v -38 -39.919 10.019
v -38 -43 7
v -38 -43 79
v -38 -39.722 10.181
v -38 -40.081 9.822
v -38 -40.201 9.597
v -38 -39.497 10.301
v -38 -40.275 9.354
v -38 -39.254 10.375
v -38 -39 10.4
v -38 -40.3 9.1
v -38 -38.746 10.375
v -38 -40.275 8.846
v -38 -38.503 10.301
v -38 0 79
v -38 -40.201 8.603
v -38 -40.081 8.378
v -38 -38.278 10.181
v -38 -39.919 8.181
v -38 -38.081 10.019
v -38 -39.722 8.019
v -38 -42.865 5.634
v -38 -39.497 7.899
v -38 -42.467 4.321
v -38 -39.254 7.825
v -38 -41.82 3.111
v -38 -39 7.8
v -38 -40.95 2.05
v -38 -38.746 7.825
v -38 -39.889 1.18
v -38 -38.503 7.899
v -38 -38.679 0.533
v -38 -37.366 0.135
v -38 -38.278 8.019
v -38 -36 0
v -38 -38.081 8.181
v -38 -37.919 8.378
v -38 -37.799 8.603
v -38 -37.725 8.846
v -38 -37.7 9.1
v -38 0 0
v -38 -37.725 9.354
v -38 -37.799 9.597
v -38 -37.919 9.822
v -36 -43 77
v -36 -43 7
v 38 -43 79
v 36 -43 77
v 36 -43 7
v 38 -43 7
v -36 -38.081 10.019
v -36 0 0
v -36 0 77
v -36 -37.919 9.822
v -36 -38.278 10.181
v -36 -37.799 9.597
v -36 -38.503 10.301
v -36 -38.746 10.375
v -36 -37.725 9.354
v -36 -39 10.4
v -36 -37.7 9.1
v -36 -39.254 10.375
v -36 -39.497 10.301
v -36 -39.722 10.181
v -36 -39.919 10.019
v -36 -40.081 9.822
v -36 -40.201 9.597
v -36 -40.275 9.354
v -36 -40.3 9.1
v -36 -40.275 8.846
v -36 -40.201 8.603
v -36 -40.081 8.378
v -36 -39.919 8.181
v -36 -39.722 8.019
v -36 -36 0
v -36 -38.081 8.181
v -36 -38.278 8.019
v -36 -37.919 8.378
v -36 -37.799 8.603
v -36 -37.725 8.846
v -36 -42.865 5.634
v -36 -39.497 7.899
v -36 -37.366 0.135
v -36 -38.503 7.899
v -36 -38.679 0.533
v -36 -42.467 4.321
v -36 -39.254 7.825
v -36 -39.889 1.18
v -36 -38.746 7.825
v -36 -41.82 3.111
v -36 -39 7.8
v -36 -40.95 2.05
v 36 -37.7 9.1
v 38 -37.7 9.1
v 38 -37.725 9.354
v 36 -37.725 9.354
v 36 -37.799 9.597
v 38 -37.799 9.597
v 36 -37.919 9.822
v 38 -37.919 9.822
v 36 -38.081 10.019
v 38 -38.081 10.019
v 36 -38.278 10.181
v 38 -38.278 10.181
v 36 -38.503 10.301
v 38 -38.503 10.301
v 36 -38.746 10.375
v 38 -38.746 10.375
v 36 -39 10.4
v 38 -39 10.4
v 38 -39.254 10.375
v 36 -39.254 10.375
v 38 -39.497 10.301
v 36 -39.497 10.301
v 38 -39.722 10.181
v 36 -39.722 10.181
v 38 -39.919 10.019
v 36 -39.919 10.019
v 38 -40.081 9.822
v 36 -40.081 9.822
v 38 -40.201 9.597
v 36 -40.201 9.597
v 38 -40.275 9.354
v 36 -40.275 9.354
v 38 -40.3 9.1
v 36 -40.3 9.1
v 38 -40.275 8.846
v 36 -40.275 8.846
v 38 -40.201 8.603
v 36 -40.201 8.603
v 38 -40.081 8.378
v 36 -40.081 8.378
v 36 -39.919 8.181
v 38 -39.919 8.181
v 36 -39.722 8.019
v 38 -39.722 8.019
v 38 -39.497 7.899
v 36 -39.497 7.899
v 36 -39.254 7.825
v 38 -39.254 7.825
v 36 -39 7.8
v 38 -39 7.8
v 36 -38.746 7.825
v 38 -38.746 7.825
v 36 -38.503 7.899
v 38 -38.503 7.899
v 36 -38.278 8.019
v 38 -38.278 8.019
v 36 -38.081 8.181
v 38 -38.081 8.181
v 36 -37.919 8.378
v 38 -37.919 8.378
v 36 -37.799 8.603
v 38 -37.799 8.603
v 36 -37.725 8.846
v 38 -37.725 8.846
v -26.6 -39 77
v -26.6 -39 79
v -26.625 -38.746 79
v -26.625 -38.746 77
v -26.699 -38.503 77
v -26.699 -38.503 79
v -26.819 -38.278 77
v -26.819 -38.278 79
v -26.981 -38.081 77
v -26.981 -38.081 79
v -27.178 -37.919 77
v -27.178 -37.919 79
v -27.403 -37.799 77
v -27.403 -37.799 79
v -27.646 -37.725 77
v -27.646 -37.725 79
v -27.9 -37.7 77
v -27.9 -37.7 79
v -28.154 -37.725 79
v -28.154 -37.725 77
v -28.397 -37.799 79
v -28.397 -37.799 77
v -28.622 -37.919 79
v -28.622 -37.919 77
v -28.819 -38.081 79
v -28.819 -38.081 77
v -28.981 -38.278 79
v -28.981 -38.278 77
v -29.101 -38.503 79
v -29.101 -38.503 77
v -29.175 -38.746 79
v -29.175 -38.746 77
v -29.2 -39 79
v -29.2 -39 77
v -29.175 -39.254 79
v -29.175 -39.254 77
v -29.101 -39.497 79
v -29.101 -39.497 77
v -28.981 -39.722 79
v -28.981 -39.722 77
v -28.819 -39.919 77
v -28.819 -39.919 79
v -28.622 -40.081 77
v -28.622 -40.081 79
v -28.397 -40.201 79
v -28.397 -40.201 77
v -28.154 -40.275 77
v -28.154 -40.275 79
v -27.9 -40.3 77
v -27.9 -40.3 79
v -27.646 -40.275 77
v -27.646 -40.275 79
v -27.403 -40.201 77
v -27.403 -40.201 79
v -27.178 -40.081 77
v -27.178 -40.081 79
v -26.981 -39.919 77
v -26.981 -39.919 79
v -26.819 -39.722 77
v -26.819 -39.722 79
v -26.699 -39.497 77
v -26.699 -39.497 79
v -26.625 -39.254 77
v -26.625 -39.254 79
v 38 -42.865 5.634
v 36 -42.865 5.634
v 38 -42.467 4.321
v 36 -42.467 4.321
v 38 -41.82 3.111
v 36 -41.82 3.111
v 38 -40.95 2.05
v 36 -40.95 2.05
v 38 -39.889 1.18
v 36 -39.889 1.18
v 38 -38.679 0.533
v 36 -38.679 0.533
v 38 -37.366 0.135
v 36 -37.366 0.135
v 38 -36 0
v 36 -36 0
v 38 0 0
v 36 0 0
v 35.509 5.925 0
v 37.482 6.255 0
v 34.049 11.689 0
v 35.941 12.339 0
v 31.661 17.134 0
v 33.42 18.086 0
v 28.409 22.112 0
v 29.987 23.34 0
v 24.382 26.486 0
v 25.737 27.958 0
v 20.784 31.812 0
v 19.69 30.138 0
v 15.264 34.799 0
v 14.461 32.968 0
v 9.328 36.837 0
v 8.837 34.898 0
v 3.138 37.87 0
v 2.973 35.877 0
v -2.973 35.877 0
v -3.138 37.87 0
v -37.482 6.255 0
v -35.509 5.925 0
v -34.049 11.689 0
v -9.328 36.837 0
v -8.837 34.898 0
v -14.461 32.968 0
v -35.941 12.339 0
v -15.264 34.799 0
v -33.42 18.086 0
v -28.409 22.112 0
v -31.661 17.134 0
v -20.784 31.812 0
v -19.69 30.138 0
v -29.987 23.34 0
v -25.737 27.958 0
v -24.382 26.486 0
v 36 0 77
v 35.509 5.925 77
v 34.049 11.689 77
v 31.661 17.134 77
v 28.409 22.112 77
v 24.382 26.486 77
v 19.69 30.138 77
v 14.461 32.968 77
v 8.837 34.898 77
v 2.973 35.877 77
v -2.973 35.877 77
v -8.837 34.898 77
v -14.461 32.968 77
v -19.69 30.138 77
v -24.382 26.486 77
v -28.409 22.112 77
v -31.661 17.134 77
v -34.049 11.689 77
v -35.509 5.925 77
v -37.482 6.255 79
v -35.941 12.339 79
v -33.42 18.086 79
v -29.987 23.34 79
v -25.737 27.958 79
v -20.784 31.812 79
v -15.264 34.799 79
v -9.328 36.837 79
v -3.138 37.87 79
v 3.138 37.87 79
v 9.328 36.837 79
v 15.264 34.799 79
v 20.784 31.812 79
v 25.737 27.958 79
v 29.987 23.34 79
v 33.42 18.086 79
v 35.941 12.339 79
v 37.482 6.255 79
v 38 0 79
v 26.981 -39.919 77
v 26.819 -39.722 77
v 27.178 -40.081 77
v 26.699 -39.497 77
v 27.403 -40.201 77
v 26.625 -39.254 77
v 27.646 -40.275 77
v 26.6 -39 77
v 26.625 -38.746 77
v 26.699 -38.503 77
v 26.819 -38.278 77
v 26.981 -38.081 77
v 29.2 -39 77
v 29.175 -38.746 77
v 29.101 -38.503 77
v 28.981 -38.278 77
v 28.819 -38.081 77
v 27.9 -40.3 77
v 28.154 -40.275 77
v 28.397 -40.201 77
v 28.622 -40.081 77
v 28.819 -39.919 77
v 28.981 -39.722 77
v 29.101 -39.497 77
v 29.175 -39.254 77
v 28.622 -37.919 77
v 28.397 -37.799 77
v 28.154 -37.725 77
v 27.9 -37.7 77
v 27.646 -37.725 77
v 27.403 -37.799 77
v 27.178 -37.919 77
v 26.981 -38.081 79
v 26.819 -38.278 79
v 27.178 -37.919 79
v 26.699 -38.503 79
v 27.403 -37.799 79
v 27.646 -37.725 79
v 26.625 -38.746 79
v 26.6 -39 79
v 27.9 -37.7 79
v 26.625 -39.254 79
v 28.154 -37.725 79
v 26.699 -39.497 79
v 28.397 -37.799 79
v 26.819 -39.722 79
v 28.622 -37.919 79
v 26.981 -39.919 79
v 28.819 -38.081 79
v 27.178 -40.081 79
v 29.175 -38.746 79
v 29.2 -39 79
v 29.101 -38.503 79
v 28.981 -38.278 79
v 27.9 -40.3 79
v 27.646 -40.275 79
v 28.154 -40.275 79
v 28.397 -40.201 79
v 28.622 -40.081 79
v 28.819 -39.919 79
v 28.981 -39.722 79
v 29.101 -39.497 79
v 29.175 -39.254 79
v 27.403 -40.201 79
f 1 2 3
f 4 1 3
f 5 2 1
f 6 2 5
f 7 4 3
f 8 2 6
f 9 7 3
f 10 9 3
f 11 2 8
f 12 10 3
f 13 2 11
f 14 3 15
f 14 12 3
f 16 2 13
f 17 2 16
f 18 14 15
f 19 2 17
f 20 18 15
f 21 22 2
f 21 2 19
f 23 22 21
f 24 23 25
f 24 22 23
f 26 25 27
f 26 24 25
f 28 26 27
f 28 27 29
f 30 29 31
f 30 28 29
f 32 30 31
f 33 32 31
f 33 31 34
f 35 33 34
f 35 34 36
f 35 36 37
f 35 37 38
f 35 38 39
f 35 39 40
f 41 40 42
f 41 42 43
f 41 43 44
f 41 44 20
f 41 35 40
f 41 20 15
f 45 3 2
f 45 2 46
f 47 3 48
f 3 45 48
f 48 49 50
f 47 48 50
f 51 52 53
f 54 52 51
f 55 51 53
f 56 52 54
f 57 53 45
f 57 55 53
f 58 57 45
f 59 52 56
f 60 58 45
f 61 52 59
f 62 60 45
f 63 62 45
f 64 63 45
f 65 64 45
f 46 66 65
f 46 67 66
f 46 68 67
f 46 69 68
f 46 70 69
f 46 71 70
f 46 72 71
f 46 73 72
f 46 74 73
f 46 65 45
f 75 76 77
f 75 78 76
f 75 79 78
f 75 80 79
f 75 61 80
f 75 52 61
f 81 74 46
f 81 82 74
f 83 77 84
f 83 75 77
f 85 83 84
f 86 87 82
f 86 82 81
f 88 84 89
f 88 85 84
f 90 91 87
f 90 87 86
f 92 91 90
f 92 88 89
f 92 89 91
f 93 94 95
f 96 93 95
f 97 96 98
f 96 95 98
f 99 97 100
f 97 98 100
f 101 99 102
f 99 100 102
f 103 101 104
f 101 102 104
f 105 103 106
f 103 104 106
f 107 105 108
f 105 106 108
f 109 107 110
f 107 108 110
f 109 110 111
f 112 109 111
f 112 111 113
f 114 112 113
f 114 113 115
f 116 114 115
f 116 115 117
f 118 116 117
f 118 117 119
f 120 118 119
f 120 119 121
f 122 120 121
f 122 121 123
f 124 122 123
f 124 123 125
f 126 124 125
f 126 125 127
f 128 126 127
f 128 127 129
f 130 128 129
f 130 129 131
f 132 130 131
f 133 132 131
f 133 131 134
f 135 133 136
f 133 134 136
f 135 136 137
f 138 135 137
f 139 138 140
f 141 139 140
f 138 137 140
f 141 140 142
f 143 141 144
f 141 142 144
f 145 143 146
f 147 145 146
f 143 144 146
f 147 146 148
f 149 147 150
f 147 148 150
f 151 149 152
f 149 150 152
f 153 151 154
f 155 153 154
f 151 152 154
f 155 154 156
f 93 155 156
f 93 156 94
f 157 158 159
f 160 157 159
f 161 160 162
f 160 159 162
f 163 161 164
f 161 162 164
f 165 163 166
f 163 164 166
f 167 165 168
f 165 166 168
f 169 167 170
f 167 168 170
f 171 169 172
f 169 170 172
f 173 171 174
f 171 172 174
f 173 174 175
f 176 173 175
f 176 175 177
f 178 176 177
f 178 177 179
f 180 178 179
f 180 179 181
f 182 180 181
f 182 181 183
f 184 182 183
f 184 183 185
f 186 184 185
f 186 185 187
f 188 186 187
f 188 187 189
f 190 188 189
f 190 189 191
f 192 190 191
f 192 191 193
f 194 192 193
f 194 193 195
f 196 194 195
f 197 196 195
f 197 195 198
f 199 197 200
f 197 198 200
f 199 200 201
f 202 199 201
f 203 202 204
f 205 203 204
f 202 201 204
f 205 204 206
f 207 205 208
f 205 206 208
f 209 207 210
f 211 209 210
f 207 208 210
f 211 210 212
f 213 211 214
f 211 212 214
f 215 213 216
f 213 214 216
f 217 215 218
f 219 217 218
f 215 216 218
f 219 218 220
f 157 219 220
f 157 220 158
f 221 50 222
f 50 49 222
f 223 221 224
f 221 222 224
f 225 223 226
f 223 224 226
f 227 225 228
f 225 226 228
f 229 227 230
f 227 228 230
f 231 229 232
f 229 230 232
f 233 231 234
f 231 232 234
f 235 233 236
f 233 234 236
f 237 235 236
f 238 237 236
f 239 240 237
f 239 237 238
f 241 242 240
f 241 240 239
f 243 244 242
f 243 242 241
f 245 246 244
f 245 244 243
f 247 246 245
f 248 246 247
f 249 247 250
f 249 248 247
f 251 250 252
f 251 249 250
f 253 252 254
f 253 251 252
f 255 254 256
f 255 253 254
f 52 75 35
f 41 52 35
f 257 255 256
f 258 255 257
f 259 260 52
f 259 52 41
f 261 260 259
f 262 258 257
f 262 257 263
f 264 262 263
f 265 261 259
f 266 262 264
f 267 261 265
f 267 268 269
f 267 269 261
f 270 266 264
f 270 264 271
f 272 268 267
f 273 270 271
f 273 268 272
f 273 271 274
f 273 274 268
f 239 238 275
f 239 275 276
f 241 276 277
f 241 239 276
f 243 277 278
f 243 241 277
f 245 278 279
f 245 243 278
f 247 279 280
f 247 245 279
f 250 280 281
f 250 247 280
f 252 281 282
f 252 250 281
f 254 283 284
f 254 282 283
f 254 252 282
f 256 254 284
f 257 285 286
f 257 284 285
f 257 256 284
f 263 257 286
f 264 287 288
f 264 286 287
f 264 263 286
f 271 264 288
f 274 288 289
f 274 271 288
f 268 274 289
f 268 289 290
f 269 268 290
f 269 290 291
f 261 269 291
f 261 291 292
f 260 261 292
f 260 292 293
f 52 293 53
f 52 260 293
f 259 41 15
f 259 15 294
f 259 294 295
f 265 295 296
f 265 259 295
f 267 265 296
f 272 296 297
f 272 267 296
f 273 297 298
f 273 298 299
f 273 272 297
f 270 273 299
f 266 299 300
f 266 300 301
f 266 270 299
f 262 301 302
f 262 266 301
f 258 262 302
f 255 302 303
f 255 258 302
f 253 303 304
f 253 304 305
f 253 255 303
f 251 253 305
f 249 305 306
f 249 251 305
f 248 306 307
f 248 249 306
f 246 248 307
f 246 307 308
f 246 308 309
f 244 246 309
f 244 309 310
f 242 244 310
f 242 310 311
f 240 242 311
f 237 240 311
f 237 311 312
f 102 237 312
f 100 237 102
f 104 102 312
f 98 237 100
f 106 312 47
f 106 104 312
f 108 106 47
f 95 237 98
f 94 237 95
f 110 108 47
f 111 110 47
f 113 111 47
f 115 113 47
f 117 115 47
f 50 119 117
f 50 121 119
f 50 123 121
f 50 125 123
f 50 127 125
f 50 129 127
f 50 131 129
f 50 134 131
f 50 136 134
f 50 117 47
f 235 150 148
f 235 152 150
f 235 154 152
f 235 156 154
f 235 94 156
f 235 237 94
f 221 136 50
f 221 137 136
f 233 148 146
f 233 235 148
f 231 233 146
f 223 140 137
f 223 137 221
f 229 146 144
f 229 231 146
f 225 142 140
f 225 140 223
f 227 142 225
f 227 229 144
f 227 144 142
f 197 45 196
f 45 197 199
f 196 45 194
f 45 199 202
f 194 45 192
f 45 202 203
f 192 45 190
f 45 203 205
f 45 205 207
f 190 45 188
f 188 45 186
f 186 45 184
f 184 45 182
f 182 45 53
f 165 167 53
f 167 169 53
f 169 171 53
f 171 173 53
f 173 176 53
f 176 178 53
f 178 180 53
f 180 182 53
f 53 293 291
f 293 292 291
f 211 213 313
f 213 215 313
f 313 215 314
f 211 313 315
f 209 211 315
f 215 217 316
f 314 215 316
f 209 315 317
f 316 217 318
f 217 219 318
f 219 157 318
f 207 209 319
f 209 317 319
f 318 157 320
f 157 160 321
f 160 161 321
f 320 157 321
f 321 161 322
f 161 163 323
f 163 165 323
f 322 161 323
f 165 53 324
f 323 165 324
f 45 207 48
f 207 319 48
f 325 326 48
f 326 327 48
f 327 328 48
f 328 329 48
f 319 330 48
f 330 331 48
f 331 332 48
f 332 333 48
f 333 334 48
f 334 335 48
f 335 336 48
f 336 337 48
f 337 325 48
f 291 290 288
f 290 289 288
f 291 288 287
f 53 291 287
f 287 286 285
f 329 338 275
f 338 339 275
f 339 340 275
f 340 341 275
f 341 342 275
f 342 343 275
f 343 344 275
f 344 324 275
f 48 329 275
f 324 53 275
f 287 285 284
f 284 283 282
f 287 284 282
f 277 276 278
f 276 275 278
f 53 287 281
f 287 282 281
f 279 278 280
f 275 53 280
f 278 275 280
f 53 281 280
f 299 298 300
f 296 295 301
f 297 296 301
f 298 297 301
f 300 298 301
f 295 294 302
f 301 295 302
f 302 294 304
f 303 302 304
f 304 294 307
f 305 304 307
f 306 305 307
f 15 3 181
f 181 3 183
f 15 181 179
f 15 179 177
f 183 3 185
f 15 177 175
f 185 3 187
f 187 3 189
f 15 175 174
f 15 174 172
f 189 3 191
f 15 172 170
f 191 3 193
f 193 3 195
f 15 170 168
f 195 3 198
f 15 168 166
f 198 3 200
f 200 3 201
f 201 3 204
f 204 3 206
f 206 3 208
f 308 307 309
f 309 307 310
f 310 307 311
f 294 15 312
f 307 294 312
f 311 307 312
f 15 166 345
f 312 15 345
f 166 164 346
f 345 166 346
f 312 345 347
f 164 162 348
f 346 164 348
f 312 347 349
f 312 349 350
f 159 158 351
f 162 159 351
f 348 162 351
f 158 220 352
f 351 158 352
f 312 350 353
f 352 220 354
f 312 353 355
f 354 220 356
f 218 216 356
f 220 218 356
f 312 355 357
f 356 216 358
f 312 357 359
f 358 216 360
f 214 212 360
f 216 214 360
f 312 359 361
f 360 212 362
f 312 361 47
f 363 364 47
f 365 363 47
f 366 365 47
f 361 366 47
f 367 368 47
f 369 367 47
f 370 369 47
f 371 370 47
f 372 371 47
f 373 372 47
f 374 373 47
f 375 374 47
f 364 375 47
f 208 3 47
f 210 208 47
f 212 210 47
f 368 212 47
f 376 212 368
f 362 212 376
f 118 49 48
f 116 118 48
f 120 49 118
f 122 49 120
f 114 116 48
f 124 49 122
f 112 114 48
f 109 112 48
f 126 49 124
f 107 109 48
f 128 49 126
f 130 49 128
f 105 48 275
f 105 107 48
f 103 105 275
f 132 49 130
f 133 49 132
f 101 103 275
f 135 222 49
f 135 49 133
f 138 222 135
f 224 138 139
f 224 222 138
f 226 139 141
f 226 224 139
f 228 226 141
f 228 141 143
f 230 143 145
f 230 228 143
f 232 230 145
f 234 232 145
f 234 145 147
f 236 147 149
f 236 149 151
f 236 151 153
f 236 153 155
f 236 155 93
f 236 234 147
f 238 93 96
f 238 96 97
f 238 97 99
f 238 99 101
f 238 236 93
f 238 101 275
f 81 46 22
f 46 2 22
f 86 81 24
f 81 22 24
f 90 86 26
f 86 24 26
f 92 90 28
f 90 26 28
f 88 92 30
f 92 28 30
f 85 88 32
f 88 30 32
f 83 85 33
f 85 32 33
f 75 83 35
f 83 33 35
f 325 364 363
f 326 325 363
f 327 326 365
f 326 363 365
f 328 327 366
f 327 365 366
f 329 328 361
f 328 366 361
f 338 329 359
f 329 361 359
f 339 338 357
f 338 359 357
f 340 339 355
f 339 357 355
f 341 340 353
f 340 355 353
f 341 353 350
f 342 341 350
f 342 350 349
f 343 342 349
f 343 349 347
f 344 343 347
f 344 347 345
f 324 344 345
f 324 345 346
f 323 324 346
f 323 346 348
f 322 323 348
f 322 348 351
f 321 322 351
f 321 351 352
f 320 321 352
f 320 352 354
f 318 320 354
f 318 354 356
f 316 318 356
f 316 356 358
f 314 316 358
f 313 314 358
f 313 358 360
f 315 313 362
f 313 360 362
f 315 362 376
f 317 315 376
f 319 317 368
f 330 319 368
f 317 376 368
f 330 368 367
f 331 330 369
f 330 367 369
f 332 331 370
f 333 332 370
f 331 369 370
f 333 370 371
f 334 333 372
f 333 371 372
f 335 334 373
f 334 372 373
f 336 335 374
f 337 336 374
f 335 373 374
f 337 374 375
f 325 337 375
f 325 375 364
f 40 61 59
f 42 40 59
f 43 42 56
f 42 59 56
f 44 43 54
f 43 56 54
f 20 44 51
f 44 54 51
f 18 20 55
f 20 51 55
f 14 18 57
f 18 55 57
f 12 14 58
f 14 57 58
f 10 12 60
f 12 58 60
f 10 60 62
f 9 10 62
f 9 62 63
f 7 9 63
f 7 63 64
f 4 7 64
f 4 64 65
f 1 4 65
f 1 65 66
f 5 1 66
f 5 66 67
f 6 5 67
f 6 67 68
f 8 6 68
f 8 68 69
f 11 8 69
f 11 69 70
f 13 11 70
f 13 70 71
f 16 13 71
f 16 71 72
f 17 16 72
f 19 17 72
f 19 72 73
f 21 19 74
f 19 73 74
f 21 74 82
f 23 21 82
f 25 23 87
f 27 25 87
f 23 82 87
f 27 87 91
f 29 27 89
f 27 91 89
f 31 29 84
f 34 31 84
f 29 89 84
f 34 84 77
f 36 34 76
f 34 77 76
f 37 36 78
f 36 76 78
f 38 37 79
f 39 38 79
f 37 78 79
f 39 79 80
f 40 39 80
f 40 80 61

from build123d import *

# Parameters (mm, degrees)
BOSS_EXTRUDE1_DEPTH                  = 79
SKETCH2_W                            = 72
SKETCH2_H                            = 2
BOSS_EXTRUDE2_DEPTH                  = 43
BOSS_EXTRUDE2_DIRECTION_2_REACH      = 99.642
BOSS_EXTRUDE2_DIRECTION_2_END_RADIUS = 36
SKETCH3_R                            = 1.3
CUT_EXTRUDE1_DEPTH                   = 10
SKETCH4_R                            = 1.3
CUT_EXTRUDE2_DEPTH                   = 118.753980824
FILLET1_R                            = 7


with BuildPart() as part:
    # Sketch1 → Boss-Extrude1 (new body)
    with BuildSketch(Plane.XY):
        with BuildLine():
            Line((-36, 0), (-36, -43))
            Line((-36, -43), (-38, -43))
            Line((-38, -43), (-38, 0))
            ThreePointArc((-38, 0), (0, 38), (38, 0))
            Line((38, 0), (38, -43))
            Line((38, -43), (36, -43))
            Line((36, -43), (36, 0))
            ThreePointArc((36, 0), (0, 36), (-36, 0))
        make_face()
    extrude(amount=BOSS_EXTRUDE1_DEPTH)

    # Sketch2 → Boss-Extrude2 (add)
    with BuildSketch(Plane(origin=(0, 0, 0), x_dir=(1, 0, 0), z_dir=(0, 1, 0))):
        with Locations((0, -78)):
            Rectangle(SKETCH2_W, SKETCH2_H)
    extrude(amount=-BOSS_EXTRUDE2_DEPTH)

    # Boss-Extrude2 direction 2: up to this cylinder (the profile starts inside it)
    boss_extrude2_direction_2_end = Plane(origin=(0, 0, 78), z_dir=(0, 0, -1)) * Cylinder(BOSS_EXTRUDE2_DIRECTION_2_END_RADIUS, 272.284, mode=Mode.PRIVATE)
    # Sketch2 → Boss-Extrude2 direction 2 (add, up to the surface)
    with BuildSketch(Plane(origin=(0, 0, 0), x_dir=(1, 0, 0), z_dir=(0, 1, 0)), mode=Mode.PRIVATE) as boss_extrude2_direction_2_sk1:
        with Locations((0, -78)):
            Rectangle(SKETCH2_W, SKETCH2_H)
    boss_extrude2_direction_2_tool1 = extrude(boss_extrude2_direction_2_sk1.sketch, amount=BOSS_EXTRUDE2_DIRECTION_2_REACH, mode=Mode.PRIVATE) & boss_extrude2_direction_2_end
    add(boss_extrude2_direction_2_tool1.solids().sort_by_distance((0, 0, 78))[0])

    # Sketch3 → Cut-Extrude1 (cut)
    with BuildSketch(Plane.XY.offset(79)):
        with Locations((-27.9, -39)):
            Circle(SKETCH3_R)
        with Locations((27.9, -39)):
            Circle(SKETCH3_R)
    extrude(amount=-CUT_EXTRUDE1_DEPTH, mode=Mode.SUBTRACT)

    # Sketch4 → Cut-Extrude2 (cut, through all)
    with BuildSketch(Plane(origin=(38, 0, 0), x_dir=(0, 0, -1), z_dir=(1, 0, 0))):
        with Locations(Location((-9.1, -39, 0), (0, 0, 90))):
            Circle(SKETCH4_R)
    extrude(amount=-CUT_EXTRUDE2_DEPTH, mode=Mode.SUBTRACT)

    # Fillet1
    fillet1_edges = [part.edges().sort_by_distance(p)[0] for p in [
        (-37, -43, 0),
        (37, -43, 0),
    ]]
    fillet(fillet1_edges, radius=FILLET1_R)


solid = part.part
